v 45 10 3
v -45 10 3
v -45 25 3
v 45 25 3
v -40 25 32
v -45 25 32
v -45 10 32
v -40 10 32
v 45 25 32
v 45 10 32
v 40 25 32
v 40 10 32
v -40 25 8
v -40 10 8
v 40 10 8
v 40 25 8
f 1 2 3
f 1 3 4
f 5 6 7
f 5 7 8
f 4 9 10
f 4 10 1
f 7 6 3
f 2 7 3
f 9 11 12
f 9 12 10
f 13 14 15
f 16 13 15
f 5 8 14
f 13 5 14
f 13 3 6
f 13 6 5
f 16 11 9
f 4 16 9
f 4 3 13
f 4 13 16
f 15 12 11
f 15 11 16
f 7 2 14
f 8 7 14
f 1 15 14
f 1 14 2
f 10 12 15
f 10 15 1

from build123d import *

# Parameters (mm, degrees)
BOSS_EXTRUDE1_DEPTH     = 10
SKETCH2_W               = 17.2
SKETCH2_H               = 43
CUT_EXTRUDE1_DEPTH      = 72.414284285
SKETCH3_W               = 90
SKETCH3_H               = 34
SKETCH3_W_2             = 80
SKETCH3_H_2             = 24
BOSS_EXTRUDE3_DEPTH     = 15
SKETCH4_W               = 49.6
SKETCH4_H               = 5
BOSS_EXTRUDE4_DEPTH     = 10
SKETCH5_W               = 15
SKETCH5_H               = 22
BOSS_EXTRUDE5_DEPTH     = 5
SKETCH6_W               = 90
SKETCH6_H               = 77
BOSS_EXTRUDE6_DEPTH     = 15
BOSS_EXTRUDE8_DEPTH     = 39
CHAMFER1_SIZE           = 64
CHAMFER1_SIZE_2         = 3.354097874
CHAMFER2_SIZE           = 64
CHAMFER2_SIZE_2         = 11.405813635
CHAMFER3_SIZE           = 64
CHAMFER3_SIZE_2         = 13.775745352
CUT_EXTRUDE3_DEPTH      = 95.500525601
CUT_EXTRUDE3_DEPTH_BACK = 95.500525601
SKETCH10_W              = 50
SKETCH10_H              = 27
SKETCH11_W              = 45.5
SKETCH11_H              = 10.5
CUT_EXTRUDE4_DEPTH      = 7.5
SKETCH14_W              = 2.05
SKETCH14_H              = 10.5
BOSS_EXTRUDE9_DEPTH     = 15
SKETCH15_R              = 8
CUT_EXTRUDE5_DEPTH      = 122.227059686
CUT_EXTRUDE6_DEPTH      = 2.5
CUT_EXTRUDE7_REACH      = 97.373
SKETCH18_W              = 29.6
SKETCH18_H              = 45
CUT_EXTRUDE8_DEPTH      = 15
SKETCH21_W              = 29.6
SKETCH21_H              = 15
BOSS_EXTRUDE10_DEPTH    = 2.5
SKETCH22_OUTSIDE_W      = 133.046
SKETCH22_OUTSIDE_H      = 133.046
SKETCH22_OUTSIDE_W_2    = 90
SKETCH22_OUTSIDE_H_2    = 72
CUT_EXTRUDE9_DEPTH      = 64
CUT_EXTRUDE10_DEPTH     = 10


with BuildPart() as part:
    # Sketch1 → Boss-Extrude1 (new body)
    with BuildSketch(Plane(origin=(0, 0, 0), x_dir=(1, 0, 0), z_dir=(0, 1, 0))):
        with BuildLine():
            Line((-35, 50), (35, 50))
            ThreePointArc((35, 50), (45.606601718, 45.606601718), (50, 35))
            Line((50, 35), (50, -35))
            ThreePointArc((50, -35), (45.606601718, -45.606601718), (35, -50))
            Line((35, -50), (-35, -50))
            ThreePointArc((-35, -50), (-45.606601718, -45.606601718), (-50, -35))
            Line((-50, -35), (-50, 35))
            ThreePointArc((-50, 35), (-45.606601718, 45.606601718), (-35, 50))
        make_face()
    extrude(amount=BOSS_EXTRUDE1_DEPTH)

    # Sketch2 → Cut-Extrude1 (cut, through all)
    with BuildSketch(Plane(origin=(0, 10, 0), x_dir=(1, 0, 0), z_dir=(0, 1, 0))):
        with Locations((-33.4, 18.5)):
            Rectangle(SKETCH2_W, SKETCH2_H)
        with Locations((33.4, 18.5)):
            Rectangle(SKETCH2_W, SKETCH2_H)
    extrude(amount=-CUT_EXTRUDE1_DEPTH, mode=Mode.SUBTRACT)

    # Sketch3 → Boss-Extrude3 (add)
    with BuildSketch(Plane(origin=(0, 10, 0), x_dir=(1, 0, 0), z_dir=(0, 1, 0))):
        with Locations((0, -20)):
            Rectangle(SKETCH3_W, SKETCH3_H)
        with Locations((0, -20)):
            Rectangle(SKETCH3_W_2, SKETCH3_H_2, mode=Mode.SUBTRACT)
    extrude(amount=BOSS_EXTRUDE3_DEPTH)

    # Sketch4 → Boss-Extrude4 (add)
    with BuildSketch(Plane(origin=(0, 10, 0), x_dir=(1, 0, 0), z_dir=(0, 1, 0))):
        with Locations((0, 10)):
            Rectangle(SKETCH4_W, SKETCH4_H)
        with Locations((0, 27)):
            Rectangle(SKETCH4_W, SKETCH4_H)
    extrude(amount=BOSS_EXTRUDE4_DEPTH)

    # Sketch5 → Boss-Extrude5 (add)
    with BuildSketch(Plane(origin=(0, 20, 0), x_dir=(1, 0, 0), z_dir=(0, 1, 0))):
        with Locations((-17.3, 18.5)):
            Rectangle(SKETCH5_W, SKETCH5_H)
        with Locations((17.3, 18.5)):
            Rectangle(SKETCH5_W, SKETCH5_H)
    extrude(amount=BOSS_EXTRUDE5_DEPTH)

    # Sketch6 → Boss-Extrude6 (add)
    with BuildSketch(Plane(origin=(0, 10, 0), x_dir=(1, 0, 0), z_dir=(0, 1, 0))):
        with BuildLine():
            Line((-50, 35), (-50, -35))
            ThreePointArc((-50, -35), (-45.606601718, -45.606601718), (-35, -50))
            Line((-35, -50), (35, -50))
            ThreePointArc((35, -50), (45.606601718, -45.606601718), (50, -35))
            Line((50, -35), (50, 35))
            ThreePointArc((50, 35), (45.606601718, 45.606601718), (35, 50))
            Line((35, 50), (-35, 50))
            ThreePointArc((-35, 50), (-45.606601718, 45.606601718), (-50, 35))
        make_face()
        with Locations((0, 1.5)):
            Rectangle(SKETCH6_W, SKETCH6_H, mode=Mode.SUBTRACT)
    extrude(amount=BOSS_EXTRUDE6_DEPTH)

    # Sketch9 → Boss-Extrude8 (add)
    with BuildSketch(Plane(origin=(0, 25, 0), x_dir=(1, 0, 0), z_dir=(0, 1, 0))):
        with BuildLine():
            Line((-50, 35), (-50, -35))
            ThreePointArc((-50, -35), (-45.606601718, -45.606601718), (-35, -50))
            Line((-35, -50), (35, -50))
            ThreePointArc((35, -50), (45.606601718, -45.606601718), (50, -35))
            Line((50, -35), (50, 35))
            ThreePointArc((50, 35), (45.606601718, 45.606601718), (35, 50))
            Line((35, 50), (-35, 50))
            ThreePointArc((-35, 50), (-45.606601718, 45.606601718), (-50, 35))
        make_face()
        with BuildLine():
            Line((-45, 35), (-45, -32))
            Line((-45, -32), (45, -32))
            Line((45, -32), (45, 35))
            ThreePointArc((45, 35), (44.659258263, 37.588190451), (43.660254038, 40))
            Line((43.660254038, 40), (-43.660254038, 40))
            ThreePointArc((-43.660254038, 40), (-44.659258263, 37.588190451), (-45, 35))
        make_face(mode=Mode.SUBTRACT)
    extrude(amount=BOSS_EXTRUDE8_DEPTH)

    # Chamfer1
    # the kernel refuses this chamfer: 64, 3.354097874 mm, written as the material it takes off along each edge
    with BuildSketch(Plane(origin=(-35, 64, 50), x_dir=(0, -0.9999979738662979, 0.002013023422382214), z_dir=(1, 0, 0)), Plane(origin=(50, 64, 35), x_dir=(0.002013023422382214, -0.9999979738662979, 0), z_dir=(0, 0, -1)), Plane(origin=(-50, 64, -35), x_dir=(-0.002013023422382214, -0.9999979738662979, 0), z_dir=(0, 0, 1)), Plane(origin=(35, 64, -50), x_dir=(0, -0.9999979738662979, -0.002013023422382214), z_dir=(-1, 0, 0))) as chamfer1_piece_1:
        Polygon((CHAMFER1_SIZE * 0.999997973866, CHAMFER1_SIZE * 0.00201302342238), (-CHAMFER1_SIZE_2 * 0.00201302342245, CHAMFER1_SIZE_2 * 0.9999979739), (0, 0), align=None)
    extrude(amount=70, mode=Mode.SUBTRACT)
    with BuildSketch(Plane(origin=(35, 64, 35), x_dir=(0, 0, 1), z_dir=(-1, 0, 0))) as chamfer1_piece_2:
        Polygon((15, -CHAMFER1_SIZE), (15 - CHAMFER1_SIZE_2, 0), (15, 0), align=None)
    revolve(axis=Axis((35, 64, 35), (0, 1, 0)), revolution_arc=90, mode=Mode.SUBTRACT)
    with BuildSketch(Plane(origin=(-35, 64, 35), x_dir=(-1, 0, 0), z_dir=(0, 0, -1))) as chamfer1_piece_3:
        Polygon((15, -CHAMFER1_SIZE), (15 - CHAMFER1_SIZE_2, 0), (15, 0), align=None)
    revolve(axis=Axis((-35, 64, 35), (0, 1, 0)), revolution_arc=90, mode=Mode.SUBTRACT)
    with BuildSketch(Plane(origin=(35, 64, -35), x_dir=(1, 0, 0), z_dir=(0, 0, 1))) as chamfer1_piece_4:
        Polygon((15, -CHAMFER1_SIZE), (15 - CHAMFER1_SIZE_2, 0), (15, 0), align=None)
    revolve(axis=Axis((35, 64, -35), (0, 1, 0)), revolution_arc=90, mode=Mode.SUBTRACT)
    with BuildSketch(Plane(origin=(-35, 64, -35), x_dir=(0, 0, -1), z_dir=(1, 0, 0))) as chamfer1_piece_5:
        Polygon((15 - CHAMFER1_SIZE_2, 0), (15, -CHAMFER1_SIZE), (15, 0), align=None)
    revolve(axis=Axis((-35, 64, -35), (0, 1, 0)), revolution_arc=90, mode=Mode.SUBTRACT)

    # Chamfer2
    # the kernel refuses this chamfer: 64, 11.405813635 mm, written as the material it takes off along each edge
    with BuildSketch(Plane(origin=(201.306482971, 64, -46.645902126), x_dir=(0, -0.9982575003065525, -0.05900816114499234), z_dir=(-1, 0, 0))) as chamfer2_piece_1:
        Polygon((CHAMFER2_SIZE * 0.999977671636, CHAMFER2_SIZE * 0.0066825316561), (-CHAMFER2_SIZE_2 * 0.0590081611462, CHAMFER2_SIZE_2 * 0.998257500326), (0, 0), align=None)
    extrude(amount=402.612965942, mode=Mode.SUBTRACT)

    # Chamfer3
    # the kernel refuses this chamfer: 64, 13.775745352 mm, written as the material it takes off along each edge
    with BuildSketch(Plane(origin=(-201.265469314, 64, 46.645902126), x_dir=(0, -0.9981787050157903, 0.06032638604292662), z_dir=(1, 0, 0))) as chamfer3_piece_1:
        Polygon((CHAMFER3_SIZE * 0.999967974892, CHAMFER3_SIZE * 0.00800307379952), (-CHAMFER3_SIZE_2 * 0.060326386045, CHAMFER3_SIZE_2 * 0.99817870505), (0, 0), align=None)
    extrude(amount=402.530938629, mode=Mode.SUBTRACT)

    # Sketch10 → Cut-Extrude3 (cut, two sides: drawn at the far end of the back side and taken through both)
    with BuildSketch(Plane(origin=(0, 1.307501734, 0), x_dir=(0, 0, 1), z_dir=(-1, 0, 0)).offset(-CUT_EXTRUDE3_DEPTH_BACK)):
        with Locations((-22.129843227, 49.192498266)):
            Rectangle(SKETCH10_W, SKETCH10_H)
    extrude(amount=CUT_EXTRUDE3_DEPTH + CUT_EXTRUDE3_DEPTH_BACK, mode=Mode.SUBTRACT)

    # Sketch11 → Cut-Extrude4 (cut)
    with BuildSketch(Plane(origin=(0, 10, 0), x_dir=(1, 0, 0), z_dir=(0, 1, 0))):
        with Locations((0, 34.75)):
            Rectangle(SKETCH11_W, SKETCH11_H)
    extrude(amount=-CUT_EXTRUDE4_DEPTH, mode=Mode.SUBTRACT)

    # Sketch14 → Boss-Extrude9 (add)
    with BuildSketch(Plane(origin=(0, 10, 0), x_dir=(1, 0, 0), z_dir=(0, 1, 0))):
        with Locations((-23.775, 34.75)):
            Rectangle(SKETCH14_W, SKETCH14_H)
        with Locations((23.775, 34.75)):
            Rectangle(SKETCH14_W, SKETCH14_H)
    extrude(amount=BOSS_EXTRUDE9_DEPTH)

    # Sketch15 → Cut-Extrude5 (cut, through all)
    with BuildSketch(Plane.XY.offset(-40)):
        with Locations((-12.75, 12.75)):
            Circle(SKETCH15_R)
        with Locations((12.75, 12.75)):
            Circle(SKETCH15_R)
    extrude(amount=-CUT_EXTRUDE5_DEPTH, mode=Mode.SUBTRACT)

    # Sketch17 → Cut-Extrude6 (cut)
    with BuildSketch(Plane(origin=(0, 0, -29.5), x_dir=(-1, 0, 0), z_dir=(0, 0, -1))):
        Polygon((-9.8, 25), (-22.75, 25), (-22.75, 2.5), (22.75, 2.5), (22.75, 25), (9.8, 25), (9.8, 20), (-9.8, 20), align=None)
    extrude(amount=-CUT_EXTRUDE6_DEPTH, mode=Mode.SUBTRACT)

    # Cut-Extrude7: up to this face of the body (flat: up to its plane)
    cut_extrude7_end = Plane(part.part.faces().sort_by_distance((0, 10, -18.5))[0])
    # Sketch18 → Cut-Extrude7 (cut, up to the picked face)
    with BuildSketch(Plane.XZ, mode=Mode.PRIVATE) as cut_extrude7_sk1:
        with Locations((0, -4.5)):
            Rectangle(SKETCH18_W, SKETCH18_H)
    cut_extrude7_tool1 = split(extrude(cut_extrude7_sk1.sketch, amount=-CUT_EXTRUDE7_REACH, mode=Mode.PRIVATE), bisect_by=cut_extrude7_end, keep=Keep.BOTH, mode=Mode.PRIVATE)
    add(cut_extrude7_tool1.solids().sort_by(Axis((0, 0, -4.5), (0, 1, 0)))[0], mode=Mode.SUBTRACT)

    # Sketch20 → Cut-Extrude8 (cut)
    with BuildSketch(Plane.XZ.offset(-25)):
        with BuildLine():
            Line((-45, -35), (-45, -40))
            Line((-45, -40), (-43.660254038, -40))
            ThreePointArc((-43.660254038, -40), (-44.659258263, -37.588190451), (-45, -35))
        make_face()
        with BuildLine():
            Line((45, -40), (45, -35))
            ThreePointArc((45, -35), (44.659258263, -37.588190451), (43.660254038, -40))
            Line((43.660254038, -40), (45, -40))
        make_face()
    extrude(amount=-CUT_EXTRUDE8_DEPTH, mode=Mode.SUBTRACT)

    # Sketch21 → Boss-Extrude10 (add)
    with BuildSketch(Plane.XZ):
        with Locations((0, -4.5)):
            Rectangle(SKETCH21_W, SKETCH21_H)
    extrude(amount=-BOSS_EXTRUDE10_DEPTH)

    # Sketch22 outside → Cut-Extrude9 (cut)
    with BuildSketch(Plane(origin=(0, 64, 0), x_dir=(1, 0, 0), z_dir=(0, 1, 0))):
        Rectangle(SKETCH22_OUTSIDE_W, SKETCH22_OUTSIDE_H)
        with Locations((0, 4)):
            Rectangle(SKETCH22_OUTSIDE_W_2, SKETCH22_OUTSIDE_H_2, mode=Mode.SUBTRACT)
    extrude(amount=-CUT_EXTRUDE9_DEPTH, mode=Mode.SUBTRACT)

    # Sketch23 → Cut-Extrude10 (cut)
    with BuildSketch(Plane.XZ):
        Polygon((-24.8, 3), (-24.8, -40), (24.8, -40), (24.8, 3), (42, 3), (42, -40), (45, -40), (45, 32), (-45, 32), (-45, -40), (-42, -40), (-42, 3), align=None)
    extrude(amount=-CUT_EXTRUDE10_DEPTH, mode=Mode.SUBTRACT)


with BuildPart() as cut_extrude10_piece_1:
    # of the separate pieces the step leaves, piece 1, a body of its own (cut_extrude10_pieces)
    add(part.part.solids().sort_by_distance((45, 10, 3))[0])


with BuildPart() as cut_extrude10_piece_2:
    # of the separate pieces the step leaves, piece 2, a body of its own (cut_extrude10_pieces)
    add(part.part.solids().sort_by_distance((24.8, 25, -7.5))[0])


solid = cut_extrude10_piece_1.part
